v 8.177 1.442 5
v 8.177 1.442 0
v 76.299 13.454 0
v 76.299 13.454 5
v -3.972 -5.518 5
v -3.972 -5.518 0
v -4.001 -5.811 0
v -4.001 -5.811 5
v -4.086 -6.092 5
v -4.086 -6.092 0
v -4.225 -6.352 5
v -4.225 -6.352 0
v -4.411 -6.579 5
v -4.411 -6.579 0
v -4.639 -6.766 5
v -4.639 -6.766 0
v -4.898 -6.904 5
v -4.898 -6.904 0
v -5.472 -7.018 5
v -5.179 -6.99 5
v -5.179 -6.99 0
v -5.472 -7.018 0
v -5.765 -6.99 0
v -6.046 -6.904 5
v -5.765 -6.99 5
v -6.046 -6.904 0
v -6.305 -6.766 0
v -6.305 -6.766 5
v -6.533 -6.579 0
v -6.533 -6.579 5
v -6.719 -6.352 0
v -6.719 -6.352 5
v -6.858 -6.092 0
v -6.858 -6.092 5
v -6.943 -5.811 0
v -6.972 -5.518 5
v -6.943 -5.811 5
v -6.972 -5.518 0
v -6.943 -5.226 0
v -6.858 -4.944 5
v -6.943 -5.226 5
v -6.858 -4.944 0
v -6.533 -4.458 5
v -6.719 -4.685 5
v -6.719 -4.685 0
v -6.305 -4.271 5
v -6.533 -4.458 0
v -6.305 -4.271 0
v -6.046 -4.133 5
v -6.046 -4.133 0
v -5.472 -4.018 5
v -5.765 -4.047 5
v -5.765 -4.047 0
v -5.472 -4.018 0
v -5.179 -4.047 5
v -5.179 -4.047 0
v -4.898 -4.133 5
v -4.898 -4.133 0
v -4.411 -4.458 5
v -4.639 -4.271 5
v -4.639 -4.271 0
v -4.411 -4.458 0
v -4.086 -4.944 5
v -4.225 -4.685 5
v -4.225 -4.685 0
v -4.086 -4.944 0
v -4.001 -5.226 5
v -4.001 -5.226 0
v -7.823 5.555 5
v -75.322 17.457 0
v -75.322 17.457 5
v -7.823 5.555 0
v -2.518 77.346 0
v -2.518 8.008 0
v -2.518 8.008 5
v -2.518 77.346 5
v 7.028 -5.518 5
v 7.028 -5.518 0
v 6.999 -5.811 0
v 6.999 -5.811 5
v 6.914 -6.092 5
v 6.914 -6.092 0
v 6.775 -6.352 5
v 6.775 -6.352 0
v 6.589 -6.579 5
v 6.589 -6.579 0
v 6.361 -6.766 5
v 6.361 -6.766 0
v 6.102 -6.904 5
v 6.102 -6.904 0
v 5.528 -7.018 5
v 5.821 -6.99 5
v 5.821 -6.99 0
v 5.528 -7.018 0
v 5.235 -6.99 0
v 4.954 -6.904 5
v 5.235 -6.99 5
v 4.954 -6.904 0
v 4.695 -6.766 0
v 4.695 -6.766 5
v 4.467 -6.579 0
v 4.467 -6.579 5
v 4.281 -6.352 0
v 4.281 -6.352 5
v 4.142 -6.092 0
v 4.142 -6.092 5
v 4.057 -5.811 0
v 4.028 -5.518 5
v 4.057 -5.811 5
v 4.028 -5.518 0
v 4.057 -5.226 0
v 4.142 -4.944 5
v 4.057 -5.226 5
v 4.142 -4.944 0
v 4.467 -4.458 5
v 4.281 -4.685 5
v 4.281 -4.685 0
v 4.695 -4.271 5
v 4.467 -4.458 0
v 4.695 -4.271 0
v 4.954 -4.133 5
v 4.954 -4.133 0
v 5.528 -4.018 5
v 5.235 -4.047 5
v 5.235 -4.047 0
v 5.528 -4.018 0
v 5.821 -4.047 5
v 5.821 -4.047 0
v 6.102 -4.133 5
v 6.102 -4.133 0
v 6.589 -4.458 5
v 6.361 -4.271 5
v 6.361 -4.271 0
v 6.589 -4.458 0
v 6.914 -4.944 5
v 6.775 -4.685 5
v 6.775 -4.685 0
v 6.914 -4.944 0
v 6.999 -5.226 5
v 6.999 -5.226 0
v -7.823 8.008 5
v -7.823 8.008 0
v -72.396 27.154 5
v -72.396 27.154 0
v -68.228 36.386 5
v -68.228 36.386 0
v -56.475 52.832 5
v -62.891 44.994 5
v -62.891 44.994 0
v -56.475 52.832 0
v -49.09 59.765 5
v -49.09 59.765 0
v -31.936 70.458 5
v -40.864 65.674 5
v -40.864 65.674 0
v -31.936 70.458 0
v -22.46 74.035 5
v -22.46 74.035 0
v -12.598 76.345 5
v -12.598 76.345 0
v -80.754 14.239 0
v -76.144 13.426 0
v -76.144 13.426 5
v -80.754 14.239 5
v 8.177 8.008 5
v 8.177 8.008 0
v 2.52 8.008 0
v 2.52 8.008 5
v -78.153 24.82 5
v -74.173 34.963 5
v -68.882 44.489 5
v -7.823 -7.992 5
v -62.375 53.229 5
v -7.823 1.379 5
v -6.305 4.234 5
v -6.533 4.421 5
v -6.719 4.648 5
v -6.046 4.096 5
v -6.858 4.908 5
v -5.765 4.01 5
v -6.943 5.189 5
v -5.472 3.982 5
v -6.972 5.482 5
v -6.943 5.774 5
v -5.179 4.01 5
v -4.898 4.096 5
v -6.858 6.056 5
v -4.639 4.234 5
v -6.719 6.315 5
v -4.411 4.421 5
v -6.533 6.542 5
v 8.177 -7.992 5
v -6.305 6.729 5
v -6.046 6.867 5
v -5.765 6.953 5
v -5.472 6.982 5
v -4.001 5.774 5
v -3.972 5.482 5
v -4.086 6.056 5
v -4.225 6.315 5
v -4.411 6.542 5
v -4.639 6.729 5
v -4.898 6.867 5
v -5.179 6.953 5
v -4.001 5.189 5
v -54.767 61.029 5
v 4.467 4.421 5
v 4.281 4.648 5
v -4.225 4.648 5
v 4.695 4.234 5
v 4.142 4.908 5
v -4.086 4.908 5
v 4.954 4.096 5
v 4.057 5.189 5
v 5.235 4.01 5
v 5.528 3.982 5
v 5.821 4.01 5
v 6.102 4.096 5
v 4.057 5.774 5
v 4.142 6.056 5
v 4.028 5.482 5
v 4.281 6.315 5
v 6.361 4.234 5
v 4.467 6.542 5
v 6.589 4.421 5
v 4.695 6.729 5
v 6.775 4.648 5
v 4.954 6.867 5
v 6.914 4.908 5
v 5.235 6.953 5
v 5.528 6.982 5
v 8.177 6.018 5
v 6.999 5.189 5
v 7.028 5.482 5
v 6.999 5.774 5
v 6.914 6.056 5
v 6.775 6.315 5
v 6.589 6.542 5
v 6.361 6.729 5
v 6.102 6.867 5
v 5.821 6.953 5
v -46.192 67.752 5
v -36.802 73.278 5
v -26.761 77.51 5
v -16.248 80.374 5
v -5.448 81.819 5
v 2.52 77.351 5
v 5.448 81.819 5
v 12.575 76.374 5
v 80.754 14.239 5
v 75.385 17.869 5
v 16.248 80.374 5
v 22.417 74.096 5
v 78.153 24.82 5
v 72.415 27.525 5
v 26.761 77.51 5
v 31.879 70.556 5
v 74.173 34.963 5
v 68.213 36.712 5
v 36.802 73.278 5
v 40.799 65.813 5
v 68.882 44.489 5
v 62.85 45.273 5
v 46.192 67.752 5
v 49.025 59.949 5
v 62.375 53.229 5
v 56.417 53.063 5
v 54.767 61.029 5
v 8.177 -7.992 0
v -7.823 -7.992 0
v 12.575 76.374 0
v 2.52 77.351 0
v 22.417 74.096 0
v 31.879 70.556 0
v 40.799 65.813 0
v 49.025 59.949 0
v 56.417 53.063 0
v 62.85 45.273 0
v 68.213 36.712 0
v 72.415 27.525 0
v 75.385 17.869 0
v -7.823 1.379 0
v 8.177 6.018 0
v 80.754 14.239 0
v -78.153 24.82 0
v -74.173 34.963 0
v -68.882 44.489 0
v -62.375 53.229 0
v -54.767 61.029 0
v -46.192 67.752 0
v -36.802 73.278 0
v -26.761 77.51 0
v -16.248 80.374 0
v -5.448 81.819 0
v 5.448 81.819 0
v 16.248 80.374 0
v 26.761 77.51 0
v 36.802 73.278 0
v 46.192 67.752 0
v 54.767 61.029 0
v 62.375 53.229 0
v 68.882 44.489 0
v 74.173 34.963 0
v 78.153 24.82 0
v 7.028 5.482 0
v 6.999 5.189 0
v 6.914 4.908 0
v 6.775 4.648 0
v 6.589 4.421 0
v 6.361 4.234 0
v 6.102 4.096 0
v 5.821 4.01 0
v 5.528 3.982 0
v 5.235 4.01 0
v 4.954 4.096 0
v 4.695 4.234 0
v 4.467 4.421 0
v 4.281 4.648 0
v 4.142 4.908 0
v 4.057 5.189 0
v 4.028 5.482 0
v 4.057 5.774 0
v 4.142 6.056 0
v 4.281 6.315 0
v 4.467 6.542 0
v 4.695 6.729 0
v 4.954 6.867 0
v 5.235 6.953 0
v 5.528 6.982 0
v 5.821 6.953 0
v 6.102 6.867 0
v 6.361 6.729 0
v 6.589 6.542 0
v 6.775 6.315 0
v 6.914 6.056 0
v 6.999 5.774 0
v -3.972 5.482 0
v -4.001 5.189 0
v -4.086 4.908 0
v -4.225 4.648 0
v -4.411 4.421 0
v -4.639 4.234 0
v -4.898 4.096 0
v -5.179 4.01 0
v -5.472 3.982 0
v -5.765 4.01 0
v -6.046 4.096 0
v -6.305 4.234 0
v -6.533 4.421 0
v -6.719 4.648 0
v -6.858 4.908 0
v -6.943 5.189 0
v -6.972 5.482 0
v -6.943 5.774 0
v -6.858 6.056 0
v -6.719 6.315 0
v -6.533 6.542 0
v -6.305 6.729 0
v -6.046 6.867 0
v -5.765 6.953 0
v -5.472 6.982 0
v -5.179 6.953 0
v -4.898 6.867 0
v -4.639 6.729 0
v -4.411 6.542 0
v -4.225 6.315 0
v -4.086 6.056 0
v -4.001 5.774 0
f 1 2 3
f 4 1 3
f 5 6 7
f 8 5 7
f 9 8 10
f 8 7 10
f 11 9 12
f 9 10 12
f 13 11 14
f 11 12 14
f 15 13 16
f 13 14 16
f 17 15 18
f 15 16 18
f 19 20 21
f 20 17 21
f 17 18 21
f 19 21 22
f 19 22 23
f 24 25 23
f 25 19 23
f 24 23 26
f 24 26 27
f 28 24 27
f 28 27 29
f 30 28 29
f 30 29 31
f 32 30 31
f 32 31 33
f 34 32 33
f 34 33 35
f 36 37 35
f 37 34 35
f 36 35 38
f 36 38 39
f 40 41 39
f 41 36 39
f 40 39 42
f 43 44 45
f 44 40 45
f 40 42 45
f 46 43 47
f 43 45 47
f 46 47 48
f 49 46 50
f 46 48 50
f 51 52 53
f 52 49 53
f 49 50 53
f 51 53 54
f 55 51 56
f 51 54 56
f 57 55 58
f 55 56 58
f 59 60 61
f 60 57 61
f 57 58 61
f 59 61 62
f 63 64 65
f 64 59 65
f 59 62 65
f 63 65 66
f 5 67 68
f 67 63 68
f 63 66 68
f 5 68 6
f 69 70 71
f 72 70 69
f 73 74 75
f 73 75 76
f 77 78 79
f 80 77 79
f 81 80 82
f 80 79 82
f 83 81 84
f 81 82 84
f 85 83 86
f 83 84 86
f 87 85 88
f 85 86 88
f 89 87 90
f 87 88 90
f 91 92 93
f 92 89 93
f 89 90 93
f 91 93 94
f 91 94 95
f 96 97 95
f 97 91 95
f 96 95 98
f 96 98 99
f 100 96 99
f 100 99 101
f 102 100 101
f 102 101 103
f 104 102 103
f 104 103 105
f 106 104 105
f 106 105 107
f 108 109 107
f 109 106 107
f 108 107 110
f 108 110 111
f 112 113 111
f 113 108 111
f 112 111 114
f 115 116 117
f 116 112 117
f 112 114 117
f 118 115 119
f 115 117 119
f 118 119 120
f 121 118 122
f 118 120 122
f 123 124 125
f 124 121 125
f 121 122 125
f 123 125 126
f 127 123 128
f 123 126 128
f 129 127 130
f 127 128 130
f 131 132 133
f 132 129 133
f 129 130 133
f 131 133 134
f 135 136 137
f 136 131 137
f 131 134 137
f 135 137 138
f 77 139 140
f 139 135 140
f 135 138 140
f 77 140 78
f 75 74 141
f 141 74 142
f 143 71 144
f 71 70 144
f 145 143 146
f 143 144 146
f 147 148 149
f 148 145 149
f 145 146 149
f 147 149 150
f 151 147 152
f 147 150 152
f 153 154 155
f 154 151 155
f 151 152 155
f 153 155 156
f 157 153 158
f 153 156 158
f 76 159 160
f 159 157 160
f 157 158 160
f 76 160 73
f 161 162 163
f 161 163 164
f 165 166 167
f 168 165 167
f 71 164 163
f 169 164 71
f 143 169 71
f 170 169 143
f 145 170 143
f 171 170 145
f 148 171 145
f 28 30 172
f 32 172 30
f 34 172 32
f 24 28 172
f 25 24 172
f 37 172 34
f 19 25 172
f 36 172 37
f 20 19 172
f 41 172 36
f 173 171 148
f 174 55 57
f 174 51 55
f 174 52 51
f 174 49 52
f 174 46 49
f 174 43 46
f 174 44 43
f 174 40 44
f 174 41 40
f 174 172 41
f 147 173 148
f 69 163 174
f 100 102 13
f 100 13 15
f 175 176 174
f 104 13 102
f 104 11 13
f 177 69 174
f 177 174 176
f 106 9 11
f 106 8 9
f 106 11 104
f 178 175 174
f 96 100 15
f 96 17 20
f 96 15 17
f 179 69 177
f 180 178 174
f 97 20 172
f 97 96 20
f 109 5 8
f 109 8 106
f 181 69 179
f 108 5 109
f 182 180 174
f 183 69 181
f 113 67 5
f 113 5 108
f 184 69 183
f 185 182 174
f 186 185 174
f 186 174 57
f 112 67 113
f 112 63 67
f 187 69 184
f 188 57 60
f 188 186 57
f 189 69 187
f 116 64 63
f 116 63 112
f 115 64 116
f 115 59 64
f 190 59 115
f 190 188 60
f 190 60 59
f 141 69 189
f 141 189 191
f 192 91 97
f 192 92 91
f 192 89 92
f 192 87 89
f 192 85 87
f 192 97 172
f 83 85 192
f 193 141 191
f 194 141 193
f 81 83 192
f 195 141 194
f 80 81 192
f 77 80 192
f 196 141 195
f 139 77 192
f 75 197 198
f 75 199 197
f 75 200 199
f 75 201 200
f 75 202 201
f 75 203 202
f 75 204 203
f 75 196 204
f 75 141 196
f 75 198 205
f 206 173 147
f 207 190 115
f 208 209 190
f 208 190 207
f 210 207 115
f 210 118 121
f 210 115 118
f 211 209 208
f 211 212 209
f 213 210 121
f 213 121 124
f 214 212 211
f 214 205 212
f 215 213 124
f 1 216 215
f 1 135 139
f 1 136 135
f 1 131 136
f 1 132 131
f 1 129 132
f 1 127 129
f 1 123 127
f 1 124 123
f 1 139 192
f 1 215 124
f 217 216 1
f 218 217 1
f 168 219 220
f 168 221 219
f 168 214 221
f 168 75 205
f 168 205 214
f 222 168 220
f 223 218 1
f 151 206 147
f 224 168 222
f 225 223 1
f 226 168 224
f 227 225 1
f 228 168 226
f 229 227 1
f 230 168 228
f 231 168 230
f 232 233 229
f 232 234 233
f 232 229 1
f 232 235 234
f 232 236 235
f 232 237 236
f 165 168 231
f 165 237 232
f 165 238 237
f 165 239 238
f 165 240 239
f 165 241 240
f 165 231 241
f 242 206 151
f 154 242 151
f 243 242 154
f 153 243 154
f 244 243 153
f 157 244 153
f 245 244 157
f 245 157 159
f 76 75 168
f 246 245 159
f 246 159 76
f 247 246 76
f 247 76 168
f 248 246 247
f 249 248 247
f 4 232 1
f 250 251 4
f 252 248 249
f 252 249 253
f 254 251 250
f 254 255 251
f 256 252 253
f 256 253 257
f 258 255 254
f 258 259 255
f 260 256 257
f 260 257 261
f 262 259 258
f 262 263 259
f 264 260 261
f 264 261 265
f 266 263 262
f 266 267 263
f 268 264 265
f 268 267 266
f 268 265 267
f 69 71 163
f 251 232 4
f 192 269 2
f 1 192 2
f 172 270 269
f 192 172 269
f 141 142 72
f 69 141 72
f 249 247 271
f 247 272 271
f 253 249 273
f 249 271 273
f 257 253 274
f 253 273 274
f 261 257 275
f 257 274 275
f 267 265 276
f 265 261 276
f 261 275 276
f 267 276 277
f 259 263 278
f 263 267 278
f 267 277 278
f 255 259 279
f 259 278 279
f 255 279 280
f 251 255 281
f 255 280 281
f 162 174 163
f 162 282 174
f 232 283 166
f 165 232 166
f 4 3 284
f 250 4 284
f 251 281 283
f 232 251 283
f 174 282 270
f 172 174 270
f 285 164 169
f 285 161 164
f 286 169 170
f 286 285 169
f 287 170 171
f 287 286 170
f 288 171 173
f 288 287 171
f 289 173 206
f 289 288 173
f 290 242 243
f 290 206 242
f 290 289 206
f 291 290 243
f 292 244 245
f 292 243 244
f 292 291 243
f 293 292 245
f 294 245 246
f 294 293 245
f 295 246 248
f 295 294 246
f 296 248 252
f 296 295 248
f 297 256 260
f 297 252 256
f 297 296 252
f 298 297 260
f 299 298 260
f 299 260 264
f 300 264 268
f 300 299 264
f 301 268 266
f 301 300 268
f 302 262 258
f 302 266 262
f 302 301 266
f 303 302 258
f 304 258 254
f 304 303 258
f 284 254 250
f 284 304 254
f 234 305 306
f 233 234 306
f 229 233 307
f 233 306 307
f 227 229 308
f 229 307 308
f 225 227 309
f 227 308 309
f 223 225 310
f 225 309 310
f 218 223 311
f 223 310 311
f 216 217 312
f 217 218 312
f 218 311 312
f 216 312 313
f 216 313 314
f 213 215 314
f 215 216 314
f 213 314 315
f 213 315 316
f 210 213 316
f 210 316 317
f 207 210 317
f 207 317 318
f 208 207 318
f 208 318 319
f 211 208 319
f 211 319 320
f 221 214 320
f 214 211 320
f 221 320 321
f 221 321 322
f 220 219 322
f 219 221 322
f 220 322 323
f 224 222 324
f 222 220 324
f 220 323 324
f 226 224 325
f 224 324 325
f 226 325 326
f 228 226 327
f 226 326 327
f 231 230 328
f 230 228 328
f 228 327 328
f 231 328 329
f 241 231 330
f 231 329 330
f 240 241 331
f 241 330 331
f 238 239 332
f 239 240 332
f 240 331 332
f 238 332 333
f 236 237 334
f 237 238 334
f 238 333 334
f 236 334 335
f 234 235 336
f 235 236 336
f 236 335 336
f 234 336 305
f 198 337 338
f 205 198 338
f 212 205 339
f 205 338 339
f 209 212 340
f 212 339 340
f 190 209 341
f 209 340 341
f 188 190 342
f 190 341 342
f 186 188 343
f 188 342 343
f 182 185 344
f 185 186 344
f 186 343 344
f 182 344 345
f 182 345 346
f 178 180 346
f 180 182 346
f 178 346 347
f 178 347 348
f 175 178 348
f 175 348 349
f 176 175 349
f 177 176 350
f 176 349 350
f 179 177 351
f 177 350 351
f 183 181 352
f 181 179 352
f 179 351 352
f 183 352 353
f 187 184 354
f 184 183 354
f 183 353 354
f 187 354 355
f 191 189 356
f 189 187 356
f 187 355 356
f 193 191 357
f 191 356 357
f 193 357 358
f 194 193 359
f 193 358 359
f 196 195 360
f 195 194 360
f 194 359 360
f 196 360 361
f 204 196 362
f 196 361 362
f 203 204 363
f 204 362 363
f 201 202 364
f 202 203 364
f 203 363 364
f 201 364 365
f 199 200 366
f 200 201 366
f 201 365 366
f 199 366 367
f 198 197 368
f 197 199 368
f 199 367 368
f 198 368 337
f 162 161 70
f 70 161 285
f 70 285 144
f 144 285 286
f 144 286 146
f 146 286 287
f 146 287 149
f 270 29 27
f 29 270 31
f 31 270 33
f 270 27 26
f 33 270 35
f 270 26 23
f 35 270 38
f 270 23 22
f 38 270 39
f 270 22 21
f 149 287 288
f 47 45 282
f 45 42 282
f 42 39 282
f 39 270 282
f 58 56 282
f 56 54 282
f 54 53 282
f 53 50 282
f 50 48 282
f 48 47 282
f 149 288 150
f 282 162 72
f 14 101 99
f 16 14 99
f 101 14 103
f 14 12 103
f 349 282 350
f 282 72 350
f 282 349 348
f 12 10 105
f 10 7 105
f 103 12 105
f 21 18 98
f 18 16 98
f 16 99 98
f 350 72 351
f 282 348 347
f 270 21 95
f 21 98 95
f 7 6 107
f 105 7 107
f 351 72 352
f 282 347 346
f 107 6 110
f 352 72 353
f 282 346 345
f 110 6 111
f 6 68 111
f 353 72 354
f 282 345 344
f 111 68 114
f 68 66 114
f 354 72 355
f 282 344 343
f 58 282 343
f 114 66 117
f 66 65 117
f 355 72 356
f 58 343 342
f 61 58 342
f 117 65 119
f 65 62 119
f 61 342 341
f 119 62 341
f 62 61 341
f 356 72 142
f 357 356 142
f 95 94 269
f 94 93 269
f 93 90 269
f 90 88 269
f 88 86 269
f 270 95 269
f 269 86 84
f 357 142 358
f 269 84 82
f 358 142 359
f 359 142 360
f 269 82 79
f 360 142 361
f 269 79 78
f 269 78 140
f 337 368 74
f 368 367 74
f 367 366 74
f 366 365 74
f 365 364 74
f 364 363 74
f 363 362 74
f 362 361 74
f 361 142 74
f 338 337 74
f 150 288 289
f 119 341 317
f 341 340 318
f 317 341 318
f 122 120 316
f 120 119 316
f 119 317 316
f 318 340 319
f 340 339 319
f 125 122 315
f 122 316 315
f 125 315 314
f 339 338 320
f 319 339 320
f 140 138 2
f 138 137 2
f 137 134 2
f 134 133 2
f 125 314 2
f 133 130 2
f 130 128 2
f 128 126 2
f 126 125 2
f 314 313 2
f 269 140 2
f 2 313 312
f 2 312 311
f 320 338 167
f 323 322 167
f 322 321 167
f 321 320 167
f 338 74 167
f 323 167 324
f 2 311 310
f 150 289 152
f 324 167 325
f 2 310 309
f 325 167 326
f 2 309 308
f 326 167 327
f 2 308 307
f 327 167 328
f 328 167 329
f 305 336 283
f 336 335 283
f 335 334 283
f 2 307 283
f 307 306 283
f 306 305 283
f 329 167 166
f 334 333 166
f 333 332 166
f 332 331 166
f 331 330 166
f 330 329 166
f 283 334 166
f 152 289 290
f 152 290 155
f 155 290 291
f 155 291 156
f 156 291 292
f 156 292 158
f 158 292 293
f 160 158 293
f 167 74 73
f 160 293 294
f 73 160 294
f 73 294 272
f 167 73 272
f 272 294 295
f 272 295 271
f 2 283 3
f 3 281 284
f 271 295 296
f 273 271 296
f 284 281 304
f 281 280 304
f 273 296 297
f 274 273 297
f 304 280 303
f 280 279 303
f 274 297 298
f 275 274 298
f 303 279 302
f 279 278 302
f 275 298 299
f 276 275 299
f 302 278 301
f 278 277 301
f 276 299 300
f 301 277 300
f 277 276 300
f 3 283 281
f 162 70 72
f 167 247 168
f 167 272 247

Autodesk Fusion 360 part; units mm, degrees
sketch "Sketch2" plane through (0, 0, 0) normal (0, 0, 1) x (1, 0, 0)
  line L0 (0, 0) -> (82, 0) construction
  line L1 (0, 0) -> (82, 0) construction
  arc A0 (80.7542, 14.2392) -> (-80.7542, 14.2392) centre (0, 0) ccw
  line L2 (-7.8232, -7.9921) -> (8.1768, -7.9921)
  circle A1 centre (-5.472, 5.4816) radius 1.5
  circle A2 centre (5.528, 5.4816) radius 1.5
  circle A3 centre (-5.472, -5.5184) radius 1.5
  circle A4 centre (5.528, -5.5184) radius 1.5
  line L3 (-75.3224, 17.4571) -> (-7.8232, 5.5552)
  line L4 (2.52, 77.3513) -> (2.52, 8.0079)
  line L5 (-2.5183, 8.0079) -> (-2.5183, 77.3462)
  line L6 (75.3853, 17.8691) -> (8.1768, 6.0184)
  arc A5 (75.3853, 17.8691) -> (2.52, 77.3513) centre (0.0798, -0.0088) ccw
  arc A6 (-2.5183, 77.3462) -> (-75.3224, 17.4571) centre (0.0798, -0.0088) ccw
  line L7 (76.2986, 13.4535) -> (80.7542, 14.2392)
  line L8 (8.1768, 1.4418) -> (76.2986, 13.4535)
  line L9 (-76.1439, 13.4262) -> (-80.7542, 14.2392)
  line L10 (-7.8232, 1.3794) -> (-76.1439, 13.4262)
  line L11 (-7.8232, 8.0079) -> (-7.8232, 5.5552)
  line L12 (-7.8232, 1.3794) -> (-7.8232, -7.9921)
  line L13 (8.1768, 8.0079) -> (2.52, 8.0079)
  line L14 (-2.5183, 8.0079) -> (-7.8232, 8.0079)
  line L15 (8.1768, -7.9921) -> (8.1768, 1.4418)
  line L16 (8.1768, 6.0184) -> (8.1768, 8.0079)
  dimension "d9" = 16
  dimension "d10" = 16
  dimension "d12" = 3
  dimension "d13" = 3
  dimension "d14" = 3
  dimension "d15" = 3
extrude "Extrude1" add sketch "Sketch2" along normal blind 5
